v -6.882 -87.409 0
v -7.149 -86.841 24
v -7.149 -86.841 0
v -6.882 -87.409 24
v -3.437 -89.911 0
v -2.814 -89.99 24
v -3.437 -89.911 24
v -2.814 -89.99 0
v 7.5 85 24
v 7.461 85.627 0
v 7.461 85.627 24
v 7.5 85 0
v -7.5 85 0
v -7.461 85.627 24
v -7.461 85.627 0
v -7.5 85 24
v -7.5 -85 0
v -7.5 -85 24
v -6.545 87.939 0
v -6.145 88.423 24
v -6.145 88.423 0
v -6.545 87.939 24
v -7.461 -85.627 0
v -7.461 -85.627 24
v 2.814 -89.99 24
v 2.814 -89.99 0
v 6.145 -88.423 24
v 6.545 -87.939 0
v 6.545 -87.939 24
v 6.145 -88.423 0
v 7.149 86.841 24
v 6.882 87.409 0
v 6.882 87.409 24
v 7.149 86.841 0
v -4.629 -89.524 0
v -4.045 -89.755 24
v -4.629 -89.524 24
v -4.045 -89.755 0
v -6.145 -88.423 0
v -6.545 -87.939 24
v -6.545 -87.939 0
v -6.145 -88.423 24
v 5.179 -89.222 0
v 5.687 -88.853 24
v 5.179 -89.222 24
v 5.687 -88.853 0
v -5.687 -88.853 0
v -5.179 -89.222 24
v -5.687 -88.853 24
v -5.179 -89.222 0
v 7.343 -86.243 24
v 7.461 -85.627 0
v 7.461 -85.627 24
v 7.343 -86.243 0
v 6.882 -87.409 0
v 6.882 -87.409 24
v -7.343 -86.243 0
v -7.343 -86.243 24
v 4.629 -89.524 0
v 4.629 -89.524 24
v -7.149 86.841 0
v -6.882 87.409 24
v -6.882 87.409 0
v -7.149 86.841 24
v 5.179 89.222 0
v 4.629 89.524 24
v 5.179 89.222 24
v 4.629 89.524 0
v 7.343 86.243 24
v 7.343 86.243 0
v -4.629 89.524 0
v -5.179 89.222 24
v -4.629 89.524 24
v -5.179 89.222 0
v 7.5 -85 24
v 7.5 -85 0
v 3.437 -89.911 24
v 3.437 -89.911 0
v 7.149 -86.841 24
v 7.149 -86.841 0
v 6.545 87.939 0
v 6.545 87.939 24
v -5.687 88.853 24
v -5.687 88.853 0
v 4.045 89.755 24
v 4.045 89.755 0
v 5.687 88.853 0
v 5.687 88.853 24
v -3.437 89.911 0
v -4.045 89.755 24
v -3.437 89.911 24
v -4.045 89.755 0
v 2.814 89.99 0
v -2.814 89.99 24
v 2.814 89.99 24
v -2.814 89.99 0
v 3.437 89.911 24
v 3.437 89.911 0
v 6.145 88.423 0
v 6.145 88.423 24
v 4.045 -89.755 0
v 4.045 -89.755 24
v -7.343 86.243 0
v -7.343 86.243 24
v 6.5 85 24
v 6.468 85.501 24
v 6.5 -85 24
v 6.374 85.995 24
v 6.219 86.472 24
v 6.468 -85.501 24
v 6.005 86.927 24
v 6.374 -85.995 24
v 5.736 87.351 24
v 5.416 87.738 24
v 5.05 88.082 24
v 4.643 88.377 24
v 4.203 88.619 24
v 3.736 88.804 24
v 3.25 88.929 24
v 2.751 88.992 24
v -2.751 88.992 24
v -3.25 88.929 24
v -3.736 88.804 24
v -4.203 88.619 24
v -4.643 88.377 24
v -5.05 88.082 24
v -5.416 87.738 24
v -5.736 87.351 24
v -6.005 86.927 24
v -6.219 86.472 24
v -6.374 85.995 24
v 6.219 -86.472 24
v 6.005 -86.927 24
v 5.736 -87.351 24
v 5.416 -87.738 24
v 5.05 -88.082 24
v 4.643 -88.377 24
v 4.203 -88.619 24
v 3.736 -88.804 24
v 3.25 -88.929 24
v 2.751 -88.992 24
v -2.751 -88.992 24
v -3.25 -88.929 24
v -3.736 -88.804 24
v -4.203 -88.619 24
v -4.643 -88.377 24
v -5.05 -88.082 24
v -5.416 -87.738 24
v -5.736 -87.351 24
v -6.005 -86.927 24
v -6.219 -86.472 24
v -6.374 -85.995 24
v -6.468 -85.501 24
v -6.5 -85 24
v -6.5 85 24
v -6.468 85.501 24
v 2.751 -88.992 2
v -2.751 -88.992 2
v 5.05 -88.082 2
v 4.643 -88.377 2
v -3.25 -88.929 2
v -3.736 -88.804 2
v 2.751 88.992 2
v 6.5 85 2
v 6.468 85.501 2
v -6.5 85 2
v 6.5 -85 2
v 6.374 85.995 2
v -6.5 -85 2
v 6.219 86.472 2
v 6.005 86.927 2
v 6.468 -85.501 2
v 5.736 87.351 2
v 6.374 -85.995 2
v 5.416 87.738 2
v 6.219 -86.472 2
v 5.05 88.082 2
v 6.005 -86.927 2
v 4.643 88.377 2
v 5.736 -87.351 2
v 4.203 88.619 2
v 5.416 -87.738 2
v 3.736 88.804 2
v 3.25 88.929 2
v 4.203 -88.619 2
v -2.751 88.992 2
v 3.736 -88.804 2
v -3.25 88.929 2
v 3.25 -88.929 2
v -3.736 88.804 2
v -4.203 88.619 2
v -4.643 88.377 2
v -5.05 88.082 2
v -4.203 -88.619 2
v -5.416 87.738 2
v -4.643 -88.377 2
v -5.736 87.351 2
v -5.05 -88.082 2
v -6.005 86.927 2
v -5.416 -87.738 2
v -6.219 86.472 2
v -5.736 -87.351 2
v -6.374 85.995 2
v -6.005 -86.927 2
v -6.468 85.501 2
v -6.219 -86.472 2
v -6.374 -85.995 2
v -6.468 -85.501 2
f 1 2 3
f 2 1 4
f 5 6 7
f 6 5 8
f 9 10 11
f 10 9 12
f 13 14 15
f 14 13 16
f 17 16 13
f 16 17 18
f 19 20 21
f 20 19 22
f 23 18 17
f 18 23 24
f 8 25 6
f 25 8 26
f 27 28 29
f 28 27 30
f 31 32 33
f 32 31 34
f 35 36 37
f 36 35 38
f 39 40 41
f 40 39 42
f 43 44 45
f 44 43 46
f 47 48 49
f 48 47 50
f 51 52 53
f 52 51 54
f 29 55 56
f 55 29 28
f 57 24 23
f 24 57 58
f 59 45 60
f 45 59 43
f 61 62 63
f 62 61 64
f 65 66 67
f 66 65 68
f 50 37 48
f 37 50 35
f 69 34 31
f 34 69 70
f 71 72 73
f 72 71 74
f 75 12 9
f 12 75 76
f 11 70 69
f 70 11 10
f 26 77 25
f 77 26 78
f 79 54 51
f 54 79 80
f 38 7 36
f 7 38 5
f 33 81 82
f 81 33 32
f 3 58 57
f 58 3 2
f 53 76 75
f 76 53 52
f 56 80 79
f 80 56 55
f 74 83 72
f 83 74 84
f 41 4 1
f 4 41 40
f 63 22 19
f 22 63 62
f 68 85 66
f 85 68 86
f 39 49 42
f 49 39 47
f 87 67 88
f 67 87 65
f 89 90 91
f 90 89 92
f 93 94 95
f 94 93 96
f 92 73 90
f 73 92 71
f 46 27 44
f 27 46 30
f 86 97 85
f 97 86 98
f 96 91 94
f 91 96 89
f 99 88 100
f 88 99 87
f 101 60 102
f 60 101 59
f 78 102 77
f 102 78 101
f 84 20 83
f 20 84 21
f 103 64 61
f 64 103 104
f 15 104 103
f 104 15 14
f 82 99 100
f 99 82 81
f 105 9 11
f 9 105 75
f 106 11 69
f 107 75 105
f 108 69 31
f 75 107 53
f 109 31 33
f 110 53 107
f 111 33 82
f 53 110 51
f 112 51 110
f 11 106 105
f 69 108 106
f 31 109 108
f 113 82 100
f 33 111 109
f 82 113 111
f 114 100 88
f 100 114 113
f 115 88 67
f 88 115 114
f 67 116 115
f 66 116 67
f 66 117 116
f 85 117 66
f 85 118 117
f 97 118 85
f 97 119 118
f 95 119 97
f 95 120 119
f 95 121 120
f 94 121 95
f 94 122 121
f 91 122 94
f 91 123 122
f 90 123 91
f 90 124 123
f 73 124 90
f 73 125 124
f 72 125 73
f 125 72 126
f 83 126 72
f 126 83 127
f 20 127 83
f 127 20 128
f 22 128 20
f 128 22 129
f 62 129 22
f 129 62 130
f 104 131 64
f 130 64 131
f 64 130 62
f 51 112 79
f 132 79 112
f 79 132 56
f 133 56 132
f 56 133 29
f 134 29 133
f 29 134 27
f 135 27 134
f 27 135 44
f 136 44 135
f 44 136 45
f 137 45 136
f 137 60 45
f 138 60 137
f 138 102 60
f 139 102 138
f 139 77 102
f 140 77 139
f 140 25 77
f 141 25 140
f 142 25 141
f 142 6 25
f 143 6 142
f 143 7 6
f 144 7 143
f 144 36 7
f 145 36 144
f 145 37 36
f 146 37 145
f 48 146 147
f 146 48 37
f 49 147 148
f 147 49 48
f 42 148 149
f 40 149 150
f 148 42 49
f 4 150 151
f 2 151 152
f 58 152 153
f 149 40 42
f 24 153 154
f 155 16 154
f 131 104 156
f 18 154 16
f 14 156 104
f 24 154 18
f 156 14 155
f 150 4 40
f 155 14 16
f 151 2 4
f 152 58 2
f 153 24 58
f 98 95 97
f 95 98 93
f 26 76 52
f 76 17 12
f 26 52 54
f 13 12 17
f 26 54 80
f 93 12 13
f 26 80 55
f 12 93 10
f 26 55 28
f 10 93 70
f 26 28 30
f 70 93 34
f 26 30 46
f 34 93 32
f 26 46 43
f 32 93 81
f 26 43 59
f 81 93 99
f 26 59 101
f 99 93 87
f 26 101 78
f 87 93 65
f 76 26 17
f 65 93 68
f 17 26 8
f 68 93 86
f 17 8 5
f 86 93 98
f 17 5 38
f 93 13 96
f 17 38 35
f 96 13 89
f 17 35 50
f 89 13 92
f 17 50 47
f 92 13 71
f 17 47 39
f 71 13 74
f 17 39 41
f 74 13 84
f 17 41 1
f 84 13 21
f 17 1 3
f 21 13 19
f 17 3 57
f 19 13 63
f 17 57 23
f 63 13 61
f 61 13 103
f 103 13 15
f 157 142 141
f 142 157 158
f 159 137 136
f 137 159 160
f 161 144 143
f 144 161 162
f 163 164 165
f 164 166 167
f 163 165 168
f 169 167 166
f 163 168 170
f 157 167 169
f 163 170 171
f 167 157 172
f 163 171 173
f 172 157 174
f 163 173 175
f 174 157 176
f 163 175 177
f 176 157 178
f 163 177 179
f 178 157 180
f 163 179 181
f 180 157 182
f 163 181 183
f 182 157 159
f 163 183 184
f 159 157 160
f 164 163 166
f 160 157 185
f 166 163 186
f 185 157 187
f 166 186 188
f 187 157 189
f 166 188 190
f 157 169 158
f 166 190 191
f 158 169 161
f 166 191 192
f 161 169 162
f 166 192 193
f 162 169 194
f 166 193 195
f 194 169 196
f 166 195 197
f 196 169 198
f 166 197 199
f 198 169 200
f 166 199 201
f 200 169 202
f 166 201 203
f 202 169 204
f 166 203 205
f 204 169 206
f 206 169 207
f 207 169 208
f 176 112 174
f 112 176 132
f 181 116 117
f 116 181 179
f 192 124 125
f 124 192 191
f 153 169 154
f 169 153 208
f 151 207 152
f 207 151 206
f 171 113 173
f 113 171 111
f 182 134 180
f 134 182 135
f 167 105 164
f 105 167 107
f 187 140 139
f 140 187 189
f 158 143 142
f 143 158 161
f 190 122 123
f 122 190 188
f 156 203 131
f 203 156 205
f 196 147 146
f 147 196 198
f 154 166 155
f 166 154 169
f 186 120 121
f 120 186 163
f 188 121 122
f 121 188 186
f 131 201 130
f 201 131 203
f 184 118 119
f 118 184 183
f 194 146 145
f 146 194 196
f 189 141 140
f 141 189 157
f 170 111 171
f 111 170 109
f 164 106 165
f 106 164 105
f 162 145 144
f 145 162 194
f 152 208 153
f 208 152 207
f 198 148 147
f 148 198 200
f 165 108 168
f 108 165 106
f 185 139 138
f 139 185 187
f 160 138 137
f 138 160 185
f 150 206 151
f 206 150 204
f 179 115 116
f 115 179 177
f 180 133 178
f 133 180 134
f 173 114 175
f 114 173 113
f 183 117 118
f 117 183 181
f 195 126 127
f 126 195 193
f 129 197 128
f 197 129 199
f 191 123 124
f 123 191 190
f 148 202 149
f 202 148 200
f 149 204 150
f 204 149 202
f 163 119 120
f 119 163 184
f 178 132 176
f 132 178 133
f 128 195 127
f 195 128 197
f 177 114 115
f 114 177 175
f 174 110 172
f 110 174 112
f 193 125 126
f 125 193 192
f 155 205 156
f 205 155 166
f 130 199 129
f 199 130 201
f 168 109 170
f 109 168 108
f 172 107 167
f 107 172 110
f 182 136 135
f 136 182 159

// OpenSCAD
$fn = 50;


difference() {
	union() {
		hull() {
			translate(v = [-2.5000000000, 85.0000000000, 0]) {
				cylinder(h = 24, r = 5);
			}
			translate(v = [2.5000000000, 85.0000000000, 0]) {
				cylinder(h = 24, r = 5);
			}
			translate(v = [-2.5000000000, -85.0000000000, 0]) {
				cylinder(h = 24, r = 5);
			}
			translate(v = [2.5000000000, -85.0000000000, 0]) {
				cylinder(h = 24, r = 5);
			}
		}
	}
	union() {
		translate(v = [0, 0, 2]) {
			hull() {
				translate(v = [-2.5000000000, 85.0000000000, 0]) {
					cylinder(h = 22, r = 4);
				}
				translate(v = [2.5000000000, 85.0000000000, 0]) {
					cylinder(h = 22, r = 4);
				}
				translate(v = [-2.5000000000, -85.0000000000, 0]) {
					cylinder(h = 22, r = 4);
				}
				translate(v = [2.5000000000, -85.0000000000, 0]) {
					cylinder(h = 22, r = 4);
				}
			}
		}
	}
}
